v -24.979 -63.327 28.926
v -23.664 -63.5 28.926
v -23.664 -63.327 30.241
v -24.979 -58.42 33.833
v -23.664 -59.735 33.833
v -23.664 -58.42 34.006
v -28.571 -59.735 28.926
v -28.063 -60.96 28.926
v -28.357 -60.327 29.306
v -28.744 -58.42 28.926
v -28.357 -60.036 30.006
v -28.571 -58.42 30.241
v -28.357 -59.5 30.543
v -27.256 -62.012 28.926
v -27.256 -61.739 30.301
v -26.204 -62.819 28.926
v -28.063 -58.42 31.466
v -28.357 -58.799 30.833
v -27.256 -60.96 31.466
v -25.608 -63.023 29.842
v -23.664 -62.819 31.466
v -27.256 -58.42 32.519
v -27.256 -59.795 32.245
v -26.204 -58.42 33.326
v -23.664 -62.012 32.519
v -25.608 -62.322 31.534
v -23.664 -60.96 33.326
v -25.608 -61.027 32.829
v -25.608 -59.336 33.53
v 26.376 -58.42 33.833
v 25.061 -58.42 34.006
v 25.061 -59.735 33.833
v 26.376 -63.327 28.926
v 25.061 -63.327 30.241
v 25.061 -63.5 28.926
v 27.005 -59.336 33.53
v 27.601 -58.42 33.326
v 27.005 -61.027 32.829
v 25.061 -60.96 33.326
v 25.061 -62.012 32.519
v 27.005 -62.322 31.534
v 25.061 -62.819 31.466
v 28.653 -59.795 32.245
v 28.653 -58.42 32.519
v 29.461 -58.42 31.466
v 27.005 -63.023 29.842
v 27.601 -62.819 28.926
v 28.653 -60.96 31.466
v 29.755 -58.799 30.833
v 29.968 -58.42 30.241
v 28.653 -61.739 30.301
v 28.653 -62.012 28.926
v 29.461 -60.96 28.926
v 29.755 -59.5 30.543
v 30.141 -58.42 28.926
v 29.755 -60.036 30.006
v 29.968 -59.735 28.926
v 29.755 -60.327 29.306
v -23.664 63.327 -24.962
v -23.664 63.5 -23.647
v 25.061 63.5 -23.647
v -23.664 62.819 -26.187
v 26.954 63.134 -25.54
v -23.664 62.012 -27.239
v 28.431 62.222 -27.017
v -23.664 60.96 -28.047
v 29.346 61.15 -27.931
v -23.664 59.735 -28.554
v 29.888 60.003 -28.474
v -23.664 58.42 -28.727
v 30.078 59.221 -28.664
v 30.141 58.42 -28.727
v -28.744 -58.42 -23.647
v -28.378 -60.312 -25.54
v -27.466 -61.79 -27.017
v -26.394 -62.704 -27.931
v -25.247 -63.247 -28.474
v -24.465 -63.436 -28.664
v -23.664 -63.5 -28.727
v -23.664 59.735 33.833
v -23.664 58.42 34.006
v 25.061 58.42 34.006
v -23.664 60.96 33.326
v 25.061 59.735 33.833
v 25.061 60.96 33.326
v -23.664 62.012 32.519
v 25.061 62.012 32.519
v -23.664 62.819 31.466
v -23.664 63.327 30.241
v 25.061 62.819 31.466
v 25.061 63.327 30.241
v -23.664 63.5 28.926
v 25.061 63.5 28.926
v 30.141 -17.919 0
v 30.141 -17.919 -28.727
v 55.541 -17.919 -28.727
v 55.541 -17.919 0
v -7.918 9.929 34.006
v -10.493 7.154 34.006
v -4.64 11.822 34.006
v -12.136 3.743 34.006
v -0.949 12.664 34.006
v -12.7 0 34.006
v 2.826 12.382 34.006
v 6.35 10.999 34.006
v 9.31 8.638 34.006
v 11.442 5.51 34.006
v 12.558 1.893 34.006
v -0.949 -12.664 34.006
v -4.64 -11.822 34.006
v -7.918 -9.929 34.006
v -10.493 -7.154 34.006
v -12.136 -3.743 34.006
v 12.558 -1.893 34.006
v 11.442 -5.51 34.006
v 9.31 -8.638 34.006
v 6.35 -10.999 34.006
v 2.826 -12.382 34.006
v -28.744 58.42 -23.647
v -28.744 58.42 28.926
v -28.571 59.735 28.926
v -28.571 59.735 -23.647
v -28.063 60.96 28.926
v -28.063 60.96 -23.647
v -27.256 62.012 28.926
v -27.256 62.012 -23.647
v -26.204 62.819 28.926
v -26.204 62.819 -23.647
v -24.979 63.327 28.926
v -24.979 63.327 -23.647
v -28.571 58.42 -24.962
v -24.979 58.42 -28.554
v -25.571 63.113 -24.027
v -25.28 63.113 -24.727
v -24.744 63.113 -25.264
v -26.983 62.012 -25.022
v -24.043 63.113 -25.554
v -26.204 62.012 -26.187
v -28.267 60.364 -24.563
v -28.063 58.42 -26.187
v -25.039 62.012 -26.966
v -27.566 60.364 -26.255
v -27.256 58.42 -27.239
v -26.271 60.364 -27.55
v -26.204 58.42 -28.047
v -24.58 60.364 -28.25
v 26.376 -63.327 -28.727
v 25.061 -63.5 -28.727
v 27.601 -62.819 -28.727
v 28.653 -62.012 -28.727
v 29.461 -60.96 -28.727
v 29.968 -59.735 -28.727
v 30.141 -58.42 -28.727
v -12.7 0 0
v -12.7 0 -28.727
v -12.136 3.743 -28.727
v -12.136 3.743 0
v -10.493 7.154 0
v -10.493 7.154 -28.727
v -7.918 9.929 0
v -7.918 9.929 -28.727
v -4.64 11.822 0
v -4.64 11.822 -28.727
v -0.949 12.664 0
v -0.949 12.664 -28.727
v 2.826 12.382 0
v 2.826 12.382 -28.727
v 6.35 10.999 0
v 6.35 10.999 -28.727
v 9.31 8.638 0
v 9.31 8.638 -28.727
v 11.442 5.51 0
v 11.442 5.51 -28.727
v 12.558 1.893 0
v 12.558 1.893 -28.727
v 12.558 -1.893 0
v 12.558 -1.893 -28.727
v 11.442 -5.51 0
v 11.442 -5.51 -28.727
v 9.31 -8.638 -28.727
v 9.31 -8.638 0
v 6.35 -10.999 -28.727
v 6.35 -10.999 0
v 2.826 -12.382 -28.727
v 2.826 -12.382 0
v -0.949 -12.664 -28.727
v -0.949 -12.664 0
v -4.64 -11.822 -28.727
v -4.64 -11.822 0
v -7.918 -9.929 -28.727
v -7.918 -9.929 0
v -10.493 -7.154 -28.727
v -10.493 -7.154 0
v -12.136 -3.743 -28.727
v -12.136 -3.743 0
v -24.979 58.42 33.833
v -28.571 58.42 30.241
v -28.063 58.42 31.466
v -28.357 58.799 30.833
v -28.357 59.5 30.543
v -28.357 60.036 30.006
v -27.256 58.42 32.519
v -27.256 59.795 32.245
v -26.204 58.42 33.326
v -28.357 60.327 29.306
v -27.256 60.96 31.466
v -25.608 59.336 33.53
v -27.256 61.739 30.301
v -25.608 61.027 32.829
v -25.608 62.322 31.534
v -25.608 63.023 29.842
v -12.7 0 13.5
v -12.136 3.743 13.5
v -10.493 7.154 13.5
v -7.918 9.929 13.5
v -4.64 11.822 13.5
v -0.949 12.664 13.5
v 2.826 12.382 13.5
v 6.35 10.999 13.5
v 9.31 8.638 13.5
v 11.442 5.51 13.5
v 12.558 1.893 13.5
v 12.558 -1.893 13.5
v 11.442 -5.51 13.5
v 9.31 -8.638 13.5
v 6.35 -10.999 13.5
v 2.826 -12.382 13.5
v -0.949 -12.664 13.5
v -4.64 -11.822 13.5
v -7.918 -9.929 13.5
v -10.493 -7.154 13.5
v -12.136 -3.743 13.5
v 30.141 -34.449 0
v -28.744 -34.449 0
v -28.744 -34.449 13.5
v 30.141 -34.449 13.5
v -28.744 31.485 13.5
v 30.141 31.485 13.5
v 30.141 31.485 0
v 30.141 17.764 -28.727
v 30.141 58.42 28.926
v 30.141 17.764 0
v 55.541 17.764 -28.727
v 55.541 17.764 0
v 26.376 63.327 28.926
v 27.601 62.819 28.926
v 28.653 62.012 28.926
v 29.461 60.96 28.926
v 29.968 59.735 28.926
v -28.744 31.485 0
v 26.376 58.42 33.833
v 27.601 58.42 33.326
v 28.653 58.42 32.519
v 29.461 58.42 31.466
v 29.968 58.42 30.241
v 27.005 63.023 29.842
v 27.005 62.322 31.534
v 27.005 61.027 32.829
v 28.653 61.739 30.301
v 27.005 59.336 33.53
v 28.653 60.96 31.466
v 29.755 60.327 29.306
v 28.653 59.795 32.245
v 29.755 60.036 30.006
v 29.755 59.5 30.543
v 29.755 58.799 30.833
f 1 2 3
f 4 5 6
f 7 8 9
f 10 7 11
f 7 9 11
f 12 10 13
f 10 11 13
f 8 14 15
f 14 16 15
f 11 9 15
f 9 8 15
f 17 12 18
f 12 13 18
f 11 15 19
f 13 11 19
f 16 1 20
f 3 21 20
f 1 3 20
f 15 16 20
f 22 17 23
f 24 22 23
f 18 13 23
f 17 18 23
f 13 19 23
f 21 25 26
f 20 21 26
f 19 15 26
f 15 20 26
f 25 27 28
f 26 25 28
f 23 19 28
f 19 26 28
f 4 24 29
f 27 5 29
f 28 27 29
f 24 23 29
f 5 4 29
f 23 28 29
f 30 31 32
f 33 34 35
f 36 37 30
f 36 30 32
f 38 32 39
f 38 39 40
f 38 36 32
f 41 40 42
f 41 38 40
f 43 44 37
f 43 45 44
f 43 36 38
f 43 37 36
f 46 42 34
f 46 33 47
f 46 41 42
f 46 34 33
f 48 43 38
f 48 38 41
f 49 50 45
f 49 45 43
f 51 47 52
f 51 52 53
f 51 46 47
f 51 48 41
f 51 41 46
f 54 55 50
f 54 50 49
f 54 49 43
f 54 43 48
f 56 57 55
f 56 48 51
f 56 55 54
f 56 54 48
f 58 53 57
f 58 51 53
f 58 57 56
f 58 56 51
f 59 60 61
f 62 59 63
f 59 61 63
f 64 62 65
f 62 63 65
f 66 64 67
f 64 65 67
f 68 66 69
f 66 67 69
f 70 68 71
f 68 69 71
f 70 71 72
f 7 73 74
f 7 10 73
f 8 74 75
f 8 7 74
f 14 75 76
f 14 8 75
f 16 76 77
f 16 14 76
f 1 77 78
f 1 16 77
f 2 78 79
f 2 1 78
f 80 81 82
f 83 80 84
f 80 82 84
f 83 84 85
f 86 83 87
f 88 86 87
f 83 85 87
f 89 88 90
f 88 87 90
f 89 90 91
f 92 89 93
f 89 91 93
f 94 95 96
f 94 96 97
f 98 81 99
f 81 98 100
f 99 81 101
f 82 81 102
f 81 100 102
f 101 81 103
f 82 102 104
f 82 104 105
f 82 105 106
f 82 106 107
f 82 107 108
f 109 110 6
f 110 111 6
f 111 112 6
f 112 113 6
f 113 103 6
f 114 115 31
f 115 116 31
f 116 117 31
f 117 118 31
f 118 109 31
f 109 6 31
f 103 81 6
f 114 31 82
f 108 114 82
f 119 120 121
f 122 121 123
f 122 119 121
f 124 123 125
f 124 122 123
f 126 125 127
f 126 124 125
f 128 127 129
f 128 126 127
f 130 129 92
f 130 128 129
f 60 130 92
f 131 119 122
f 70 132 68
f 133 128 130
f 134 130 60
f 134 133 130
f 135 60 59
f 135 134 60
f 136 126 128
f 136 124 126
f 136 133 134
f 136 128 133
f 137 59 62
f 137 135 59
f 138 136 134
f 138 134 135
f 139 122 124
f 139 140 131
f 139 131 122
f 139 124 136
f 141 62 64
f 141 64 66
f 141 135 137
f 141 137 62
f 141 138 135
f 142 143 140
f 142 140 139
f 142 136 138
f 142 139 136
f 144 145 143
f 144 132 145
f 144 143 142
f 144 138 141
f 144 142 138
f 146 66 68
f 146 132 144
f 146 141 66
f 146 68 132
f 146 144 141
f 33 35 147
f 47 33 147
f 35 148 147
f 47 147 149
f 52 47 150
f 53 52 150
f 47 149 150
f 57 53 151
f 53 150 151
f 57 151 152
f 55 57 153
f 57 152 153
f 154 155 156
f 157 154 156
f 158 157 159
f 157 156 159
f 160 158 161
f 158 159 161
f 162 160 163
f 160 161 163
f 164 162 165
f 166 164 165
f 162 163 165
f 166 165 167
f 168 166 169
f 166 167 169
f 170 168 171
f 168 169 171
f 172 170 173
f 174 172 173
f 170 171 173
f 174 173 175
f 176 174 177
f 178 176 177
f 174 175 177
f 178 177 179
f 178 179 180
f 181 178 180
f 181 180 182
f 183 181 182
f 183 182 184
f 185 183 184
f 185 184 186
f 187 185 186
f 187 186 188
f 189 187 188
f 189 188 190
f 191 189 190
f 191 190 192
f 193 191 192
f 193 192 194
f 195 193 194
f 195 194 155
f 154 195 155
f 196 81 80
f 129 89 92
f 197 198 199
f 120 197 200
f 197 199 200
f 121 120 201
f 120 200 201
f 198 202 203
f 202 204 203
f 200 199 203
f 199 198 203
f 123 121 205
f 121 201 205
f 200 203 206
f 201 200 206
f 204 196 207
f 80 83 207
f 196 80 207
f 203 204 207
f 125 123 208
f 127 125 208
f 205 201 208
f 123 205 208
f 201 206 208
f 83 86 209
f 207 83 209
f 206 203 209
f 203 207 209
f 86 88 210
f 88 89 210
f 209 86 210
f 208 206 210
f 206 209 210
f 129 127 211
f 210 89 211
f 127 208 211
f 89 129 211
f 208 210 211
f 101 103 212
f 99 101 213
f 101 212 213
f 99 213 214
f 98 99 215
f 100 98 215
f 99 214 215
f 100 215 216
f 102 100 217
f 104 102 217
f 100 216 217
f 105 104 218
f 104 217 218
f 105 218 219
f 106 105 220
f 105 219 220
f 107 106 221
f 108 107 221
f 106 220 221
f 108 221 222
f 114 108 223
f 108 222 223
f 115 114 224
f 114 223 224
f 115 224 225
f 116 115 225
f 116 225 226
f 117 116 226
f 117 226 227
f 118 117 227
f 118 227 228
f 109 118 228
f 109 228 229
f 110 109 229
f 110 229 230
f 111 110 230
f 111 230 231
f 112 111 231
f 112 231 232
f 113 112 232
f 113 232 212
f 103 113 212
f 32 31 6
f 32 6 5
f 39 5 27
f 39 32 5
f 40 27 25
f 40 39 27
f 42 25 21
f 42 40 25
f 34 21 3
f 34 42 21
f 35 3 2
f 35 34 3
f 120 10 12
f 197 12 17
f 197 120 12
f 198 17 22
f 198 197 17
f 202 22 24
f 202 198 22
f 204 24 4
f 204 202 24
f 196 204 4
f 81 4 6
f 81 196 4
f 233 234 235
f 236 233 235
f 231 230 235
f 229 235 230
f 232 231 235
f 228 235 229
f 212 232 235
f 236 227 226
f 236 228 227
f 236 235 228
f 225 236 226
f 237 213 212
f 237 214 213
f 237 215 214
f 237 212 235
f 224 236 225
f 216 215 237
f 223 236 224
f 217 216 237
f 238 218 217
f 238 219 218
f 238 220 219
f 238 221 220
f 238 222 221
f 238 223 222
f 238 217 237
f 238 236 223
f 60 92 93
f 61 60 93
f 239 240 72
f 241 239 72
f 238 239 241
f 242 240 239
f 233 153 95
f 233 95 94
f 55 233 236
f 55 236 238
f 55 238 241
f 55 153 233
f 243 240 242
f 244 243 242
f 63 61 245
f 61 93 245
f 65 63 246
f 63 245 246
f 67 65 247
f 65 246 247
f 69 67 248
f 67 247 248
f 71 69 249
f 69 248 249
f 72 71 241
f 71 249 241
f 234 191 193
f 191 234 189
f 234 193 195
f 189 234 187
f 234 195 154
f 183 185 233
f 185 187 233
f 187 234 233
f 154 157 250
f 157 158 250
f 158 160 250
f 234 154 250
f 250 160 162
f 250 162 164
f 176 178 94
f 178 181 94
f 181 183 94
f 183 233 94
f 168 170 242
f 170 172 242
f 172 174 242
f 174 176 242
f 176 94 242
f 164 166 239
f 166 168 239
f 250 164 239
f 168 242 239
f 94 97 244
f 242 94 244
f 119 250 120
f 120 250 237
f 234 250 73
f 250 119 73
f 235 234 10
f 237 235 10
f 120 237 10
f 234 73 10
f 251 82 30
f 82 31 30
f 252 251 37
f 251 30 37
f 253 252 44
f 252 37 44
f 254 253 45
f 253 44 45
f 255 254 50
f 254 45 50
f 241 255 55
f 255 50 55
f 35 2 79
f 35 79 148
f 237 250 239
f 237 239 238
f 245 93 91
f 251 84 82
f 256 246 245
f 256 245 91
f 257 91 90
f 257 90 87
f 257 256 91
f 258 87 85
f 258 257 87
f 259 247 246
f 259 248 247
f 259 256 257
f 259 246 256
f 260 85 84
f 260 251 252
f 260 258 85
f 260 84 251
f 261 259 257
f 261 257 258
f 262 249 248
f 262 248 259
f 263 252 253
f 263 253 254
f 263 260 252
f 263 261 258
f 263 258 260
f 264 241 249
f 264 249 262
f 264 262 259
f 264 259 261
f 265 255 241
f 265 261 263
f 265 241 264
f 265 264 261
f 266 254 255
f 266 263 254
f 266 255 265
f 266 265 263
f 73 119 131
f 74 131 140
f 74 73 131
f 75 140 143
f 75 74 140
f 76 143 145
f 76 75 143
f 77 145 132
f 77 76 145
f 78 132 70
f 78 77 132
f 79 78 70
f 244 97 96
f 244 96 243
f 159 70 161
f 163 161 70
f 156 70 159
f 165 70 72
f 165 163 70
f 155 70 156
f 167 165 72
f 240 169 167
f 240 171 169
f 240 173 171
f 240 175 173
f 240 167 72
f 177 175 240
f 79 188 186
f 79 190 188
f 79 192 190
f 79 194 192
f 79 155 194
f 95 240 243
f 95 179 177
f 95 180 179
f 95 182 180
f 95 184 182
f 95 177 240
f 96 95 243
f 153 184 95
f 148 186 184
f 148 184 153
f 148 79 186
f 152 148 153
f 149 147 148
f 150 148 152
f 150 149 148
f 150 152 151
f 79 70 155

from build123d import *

# Parameters (mm, degrees)
F0_W          = 58.8852874935
F0_H          = 62.7336800098
F1_DEPTH      = 63.5
F2_W          = 65.9335851669
F2_H          = 13.4996175766
F3_DEPTH      = 30.1423424313
F3_DEPTH_BACK = 28.7439450622
F4_R          = 5.08
F5_R          = 5.08
F6_R          = 5.08
F7_W          = 35.6836467981
F7_H          = 28.7272408605
F8_DEPTH      = 25.4
F10_D         = 25.4


with BuildPart() as f1:
    # F0 (on Front) → F1 (new body, symmetric)
    with BuildSketch(Plane.XZ):
        with Locations((0.6986986846, 2.6395991445)):
            Rectangle(F0_W, F0_H)
    extrude(amount=F1_DEPTH, both=True)

    # F2 (on Right) → F3 (cut, two sides)
    with BuildSketch(Plane.YZ) as f3_sk:
        with Locations((-1.4819055796, 6.7498087883)):
            Rectangle(F2_W, F2_H)
    extrude(amount=F3_DEPTH, mode=Mode.SUBTRACT)
    extrude(f3_sk.sketch, amount=-F3_DEPTH_BACK, mode=Mode.SUBTRACT)

    # F4
    f4_edges = [f1.edges().sort_by_distance(p)[0] for p in [
        (0.698699, 63.5, 34.006439),
    ]]
    fillet(f4_edges, radius=F4_R)

    # F5
    f5_edges = [f1.edges().sort_by_distance(p)[0] for p in [
        (0.698699, -63.5, 34.006439),
    ]]
    fillet(f5_edges, radius=F5_R)

    # F6
    f6_edges = [f1.edges().sort_by_distance(p)[0] for p in [
        (-28.743945, 0, -28.727241),
        (-28.743945, -63.5, 0.099599),
        (-28.743945, 63.5, 0.099599),
        (30.141342, 63.5, 0.099599),
        (30.141342, 0, 34.006439),
        (-28.743945, 0, 34.006439),
        (0.698699, 63.5, -28.727241),
    ]]
    fillet(f6_edges, radius=F6_R)

    # F7 (on face) → F8 (join)
    with BuildSketch(Plane.YZ.offset(30.1413424313)):
        with Locations((-0.0774413347, -14.3636204302)):
            Rectangle(F7_W, F7_H)
    extrude(amount=F8_DEPTH)

    # F10 (through all)
    with Locations(Plane.XY.offset(34.0064391494)):
        with Locations((0, 0)):
            Hole(F10_D / 2)


solid = f1.part
